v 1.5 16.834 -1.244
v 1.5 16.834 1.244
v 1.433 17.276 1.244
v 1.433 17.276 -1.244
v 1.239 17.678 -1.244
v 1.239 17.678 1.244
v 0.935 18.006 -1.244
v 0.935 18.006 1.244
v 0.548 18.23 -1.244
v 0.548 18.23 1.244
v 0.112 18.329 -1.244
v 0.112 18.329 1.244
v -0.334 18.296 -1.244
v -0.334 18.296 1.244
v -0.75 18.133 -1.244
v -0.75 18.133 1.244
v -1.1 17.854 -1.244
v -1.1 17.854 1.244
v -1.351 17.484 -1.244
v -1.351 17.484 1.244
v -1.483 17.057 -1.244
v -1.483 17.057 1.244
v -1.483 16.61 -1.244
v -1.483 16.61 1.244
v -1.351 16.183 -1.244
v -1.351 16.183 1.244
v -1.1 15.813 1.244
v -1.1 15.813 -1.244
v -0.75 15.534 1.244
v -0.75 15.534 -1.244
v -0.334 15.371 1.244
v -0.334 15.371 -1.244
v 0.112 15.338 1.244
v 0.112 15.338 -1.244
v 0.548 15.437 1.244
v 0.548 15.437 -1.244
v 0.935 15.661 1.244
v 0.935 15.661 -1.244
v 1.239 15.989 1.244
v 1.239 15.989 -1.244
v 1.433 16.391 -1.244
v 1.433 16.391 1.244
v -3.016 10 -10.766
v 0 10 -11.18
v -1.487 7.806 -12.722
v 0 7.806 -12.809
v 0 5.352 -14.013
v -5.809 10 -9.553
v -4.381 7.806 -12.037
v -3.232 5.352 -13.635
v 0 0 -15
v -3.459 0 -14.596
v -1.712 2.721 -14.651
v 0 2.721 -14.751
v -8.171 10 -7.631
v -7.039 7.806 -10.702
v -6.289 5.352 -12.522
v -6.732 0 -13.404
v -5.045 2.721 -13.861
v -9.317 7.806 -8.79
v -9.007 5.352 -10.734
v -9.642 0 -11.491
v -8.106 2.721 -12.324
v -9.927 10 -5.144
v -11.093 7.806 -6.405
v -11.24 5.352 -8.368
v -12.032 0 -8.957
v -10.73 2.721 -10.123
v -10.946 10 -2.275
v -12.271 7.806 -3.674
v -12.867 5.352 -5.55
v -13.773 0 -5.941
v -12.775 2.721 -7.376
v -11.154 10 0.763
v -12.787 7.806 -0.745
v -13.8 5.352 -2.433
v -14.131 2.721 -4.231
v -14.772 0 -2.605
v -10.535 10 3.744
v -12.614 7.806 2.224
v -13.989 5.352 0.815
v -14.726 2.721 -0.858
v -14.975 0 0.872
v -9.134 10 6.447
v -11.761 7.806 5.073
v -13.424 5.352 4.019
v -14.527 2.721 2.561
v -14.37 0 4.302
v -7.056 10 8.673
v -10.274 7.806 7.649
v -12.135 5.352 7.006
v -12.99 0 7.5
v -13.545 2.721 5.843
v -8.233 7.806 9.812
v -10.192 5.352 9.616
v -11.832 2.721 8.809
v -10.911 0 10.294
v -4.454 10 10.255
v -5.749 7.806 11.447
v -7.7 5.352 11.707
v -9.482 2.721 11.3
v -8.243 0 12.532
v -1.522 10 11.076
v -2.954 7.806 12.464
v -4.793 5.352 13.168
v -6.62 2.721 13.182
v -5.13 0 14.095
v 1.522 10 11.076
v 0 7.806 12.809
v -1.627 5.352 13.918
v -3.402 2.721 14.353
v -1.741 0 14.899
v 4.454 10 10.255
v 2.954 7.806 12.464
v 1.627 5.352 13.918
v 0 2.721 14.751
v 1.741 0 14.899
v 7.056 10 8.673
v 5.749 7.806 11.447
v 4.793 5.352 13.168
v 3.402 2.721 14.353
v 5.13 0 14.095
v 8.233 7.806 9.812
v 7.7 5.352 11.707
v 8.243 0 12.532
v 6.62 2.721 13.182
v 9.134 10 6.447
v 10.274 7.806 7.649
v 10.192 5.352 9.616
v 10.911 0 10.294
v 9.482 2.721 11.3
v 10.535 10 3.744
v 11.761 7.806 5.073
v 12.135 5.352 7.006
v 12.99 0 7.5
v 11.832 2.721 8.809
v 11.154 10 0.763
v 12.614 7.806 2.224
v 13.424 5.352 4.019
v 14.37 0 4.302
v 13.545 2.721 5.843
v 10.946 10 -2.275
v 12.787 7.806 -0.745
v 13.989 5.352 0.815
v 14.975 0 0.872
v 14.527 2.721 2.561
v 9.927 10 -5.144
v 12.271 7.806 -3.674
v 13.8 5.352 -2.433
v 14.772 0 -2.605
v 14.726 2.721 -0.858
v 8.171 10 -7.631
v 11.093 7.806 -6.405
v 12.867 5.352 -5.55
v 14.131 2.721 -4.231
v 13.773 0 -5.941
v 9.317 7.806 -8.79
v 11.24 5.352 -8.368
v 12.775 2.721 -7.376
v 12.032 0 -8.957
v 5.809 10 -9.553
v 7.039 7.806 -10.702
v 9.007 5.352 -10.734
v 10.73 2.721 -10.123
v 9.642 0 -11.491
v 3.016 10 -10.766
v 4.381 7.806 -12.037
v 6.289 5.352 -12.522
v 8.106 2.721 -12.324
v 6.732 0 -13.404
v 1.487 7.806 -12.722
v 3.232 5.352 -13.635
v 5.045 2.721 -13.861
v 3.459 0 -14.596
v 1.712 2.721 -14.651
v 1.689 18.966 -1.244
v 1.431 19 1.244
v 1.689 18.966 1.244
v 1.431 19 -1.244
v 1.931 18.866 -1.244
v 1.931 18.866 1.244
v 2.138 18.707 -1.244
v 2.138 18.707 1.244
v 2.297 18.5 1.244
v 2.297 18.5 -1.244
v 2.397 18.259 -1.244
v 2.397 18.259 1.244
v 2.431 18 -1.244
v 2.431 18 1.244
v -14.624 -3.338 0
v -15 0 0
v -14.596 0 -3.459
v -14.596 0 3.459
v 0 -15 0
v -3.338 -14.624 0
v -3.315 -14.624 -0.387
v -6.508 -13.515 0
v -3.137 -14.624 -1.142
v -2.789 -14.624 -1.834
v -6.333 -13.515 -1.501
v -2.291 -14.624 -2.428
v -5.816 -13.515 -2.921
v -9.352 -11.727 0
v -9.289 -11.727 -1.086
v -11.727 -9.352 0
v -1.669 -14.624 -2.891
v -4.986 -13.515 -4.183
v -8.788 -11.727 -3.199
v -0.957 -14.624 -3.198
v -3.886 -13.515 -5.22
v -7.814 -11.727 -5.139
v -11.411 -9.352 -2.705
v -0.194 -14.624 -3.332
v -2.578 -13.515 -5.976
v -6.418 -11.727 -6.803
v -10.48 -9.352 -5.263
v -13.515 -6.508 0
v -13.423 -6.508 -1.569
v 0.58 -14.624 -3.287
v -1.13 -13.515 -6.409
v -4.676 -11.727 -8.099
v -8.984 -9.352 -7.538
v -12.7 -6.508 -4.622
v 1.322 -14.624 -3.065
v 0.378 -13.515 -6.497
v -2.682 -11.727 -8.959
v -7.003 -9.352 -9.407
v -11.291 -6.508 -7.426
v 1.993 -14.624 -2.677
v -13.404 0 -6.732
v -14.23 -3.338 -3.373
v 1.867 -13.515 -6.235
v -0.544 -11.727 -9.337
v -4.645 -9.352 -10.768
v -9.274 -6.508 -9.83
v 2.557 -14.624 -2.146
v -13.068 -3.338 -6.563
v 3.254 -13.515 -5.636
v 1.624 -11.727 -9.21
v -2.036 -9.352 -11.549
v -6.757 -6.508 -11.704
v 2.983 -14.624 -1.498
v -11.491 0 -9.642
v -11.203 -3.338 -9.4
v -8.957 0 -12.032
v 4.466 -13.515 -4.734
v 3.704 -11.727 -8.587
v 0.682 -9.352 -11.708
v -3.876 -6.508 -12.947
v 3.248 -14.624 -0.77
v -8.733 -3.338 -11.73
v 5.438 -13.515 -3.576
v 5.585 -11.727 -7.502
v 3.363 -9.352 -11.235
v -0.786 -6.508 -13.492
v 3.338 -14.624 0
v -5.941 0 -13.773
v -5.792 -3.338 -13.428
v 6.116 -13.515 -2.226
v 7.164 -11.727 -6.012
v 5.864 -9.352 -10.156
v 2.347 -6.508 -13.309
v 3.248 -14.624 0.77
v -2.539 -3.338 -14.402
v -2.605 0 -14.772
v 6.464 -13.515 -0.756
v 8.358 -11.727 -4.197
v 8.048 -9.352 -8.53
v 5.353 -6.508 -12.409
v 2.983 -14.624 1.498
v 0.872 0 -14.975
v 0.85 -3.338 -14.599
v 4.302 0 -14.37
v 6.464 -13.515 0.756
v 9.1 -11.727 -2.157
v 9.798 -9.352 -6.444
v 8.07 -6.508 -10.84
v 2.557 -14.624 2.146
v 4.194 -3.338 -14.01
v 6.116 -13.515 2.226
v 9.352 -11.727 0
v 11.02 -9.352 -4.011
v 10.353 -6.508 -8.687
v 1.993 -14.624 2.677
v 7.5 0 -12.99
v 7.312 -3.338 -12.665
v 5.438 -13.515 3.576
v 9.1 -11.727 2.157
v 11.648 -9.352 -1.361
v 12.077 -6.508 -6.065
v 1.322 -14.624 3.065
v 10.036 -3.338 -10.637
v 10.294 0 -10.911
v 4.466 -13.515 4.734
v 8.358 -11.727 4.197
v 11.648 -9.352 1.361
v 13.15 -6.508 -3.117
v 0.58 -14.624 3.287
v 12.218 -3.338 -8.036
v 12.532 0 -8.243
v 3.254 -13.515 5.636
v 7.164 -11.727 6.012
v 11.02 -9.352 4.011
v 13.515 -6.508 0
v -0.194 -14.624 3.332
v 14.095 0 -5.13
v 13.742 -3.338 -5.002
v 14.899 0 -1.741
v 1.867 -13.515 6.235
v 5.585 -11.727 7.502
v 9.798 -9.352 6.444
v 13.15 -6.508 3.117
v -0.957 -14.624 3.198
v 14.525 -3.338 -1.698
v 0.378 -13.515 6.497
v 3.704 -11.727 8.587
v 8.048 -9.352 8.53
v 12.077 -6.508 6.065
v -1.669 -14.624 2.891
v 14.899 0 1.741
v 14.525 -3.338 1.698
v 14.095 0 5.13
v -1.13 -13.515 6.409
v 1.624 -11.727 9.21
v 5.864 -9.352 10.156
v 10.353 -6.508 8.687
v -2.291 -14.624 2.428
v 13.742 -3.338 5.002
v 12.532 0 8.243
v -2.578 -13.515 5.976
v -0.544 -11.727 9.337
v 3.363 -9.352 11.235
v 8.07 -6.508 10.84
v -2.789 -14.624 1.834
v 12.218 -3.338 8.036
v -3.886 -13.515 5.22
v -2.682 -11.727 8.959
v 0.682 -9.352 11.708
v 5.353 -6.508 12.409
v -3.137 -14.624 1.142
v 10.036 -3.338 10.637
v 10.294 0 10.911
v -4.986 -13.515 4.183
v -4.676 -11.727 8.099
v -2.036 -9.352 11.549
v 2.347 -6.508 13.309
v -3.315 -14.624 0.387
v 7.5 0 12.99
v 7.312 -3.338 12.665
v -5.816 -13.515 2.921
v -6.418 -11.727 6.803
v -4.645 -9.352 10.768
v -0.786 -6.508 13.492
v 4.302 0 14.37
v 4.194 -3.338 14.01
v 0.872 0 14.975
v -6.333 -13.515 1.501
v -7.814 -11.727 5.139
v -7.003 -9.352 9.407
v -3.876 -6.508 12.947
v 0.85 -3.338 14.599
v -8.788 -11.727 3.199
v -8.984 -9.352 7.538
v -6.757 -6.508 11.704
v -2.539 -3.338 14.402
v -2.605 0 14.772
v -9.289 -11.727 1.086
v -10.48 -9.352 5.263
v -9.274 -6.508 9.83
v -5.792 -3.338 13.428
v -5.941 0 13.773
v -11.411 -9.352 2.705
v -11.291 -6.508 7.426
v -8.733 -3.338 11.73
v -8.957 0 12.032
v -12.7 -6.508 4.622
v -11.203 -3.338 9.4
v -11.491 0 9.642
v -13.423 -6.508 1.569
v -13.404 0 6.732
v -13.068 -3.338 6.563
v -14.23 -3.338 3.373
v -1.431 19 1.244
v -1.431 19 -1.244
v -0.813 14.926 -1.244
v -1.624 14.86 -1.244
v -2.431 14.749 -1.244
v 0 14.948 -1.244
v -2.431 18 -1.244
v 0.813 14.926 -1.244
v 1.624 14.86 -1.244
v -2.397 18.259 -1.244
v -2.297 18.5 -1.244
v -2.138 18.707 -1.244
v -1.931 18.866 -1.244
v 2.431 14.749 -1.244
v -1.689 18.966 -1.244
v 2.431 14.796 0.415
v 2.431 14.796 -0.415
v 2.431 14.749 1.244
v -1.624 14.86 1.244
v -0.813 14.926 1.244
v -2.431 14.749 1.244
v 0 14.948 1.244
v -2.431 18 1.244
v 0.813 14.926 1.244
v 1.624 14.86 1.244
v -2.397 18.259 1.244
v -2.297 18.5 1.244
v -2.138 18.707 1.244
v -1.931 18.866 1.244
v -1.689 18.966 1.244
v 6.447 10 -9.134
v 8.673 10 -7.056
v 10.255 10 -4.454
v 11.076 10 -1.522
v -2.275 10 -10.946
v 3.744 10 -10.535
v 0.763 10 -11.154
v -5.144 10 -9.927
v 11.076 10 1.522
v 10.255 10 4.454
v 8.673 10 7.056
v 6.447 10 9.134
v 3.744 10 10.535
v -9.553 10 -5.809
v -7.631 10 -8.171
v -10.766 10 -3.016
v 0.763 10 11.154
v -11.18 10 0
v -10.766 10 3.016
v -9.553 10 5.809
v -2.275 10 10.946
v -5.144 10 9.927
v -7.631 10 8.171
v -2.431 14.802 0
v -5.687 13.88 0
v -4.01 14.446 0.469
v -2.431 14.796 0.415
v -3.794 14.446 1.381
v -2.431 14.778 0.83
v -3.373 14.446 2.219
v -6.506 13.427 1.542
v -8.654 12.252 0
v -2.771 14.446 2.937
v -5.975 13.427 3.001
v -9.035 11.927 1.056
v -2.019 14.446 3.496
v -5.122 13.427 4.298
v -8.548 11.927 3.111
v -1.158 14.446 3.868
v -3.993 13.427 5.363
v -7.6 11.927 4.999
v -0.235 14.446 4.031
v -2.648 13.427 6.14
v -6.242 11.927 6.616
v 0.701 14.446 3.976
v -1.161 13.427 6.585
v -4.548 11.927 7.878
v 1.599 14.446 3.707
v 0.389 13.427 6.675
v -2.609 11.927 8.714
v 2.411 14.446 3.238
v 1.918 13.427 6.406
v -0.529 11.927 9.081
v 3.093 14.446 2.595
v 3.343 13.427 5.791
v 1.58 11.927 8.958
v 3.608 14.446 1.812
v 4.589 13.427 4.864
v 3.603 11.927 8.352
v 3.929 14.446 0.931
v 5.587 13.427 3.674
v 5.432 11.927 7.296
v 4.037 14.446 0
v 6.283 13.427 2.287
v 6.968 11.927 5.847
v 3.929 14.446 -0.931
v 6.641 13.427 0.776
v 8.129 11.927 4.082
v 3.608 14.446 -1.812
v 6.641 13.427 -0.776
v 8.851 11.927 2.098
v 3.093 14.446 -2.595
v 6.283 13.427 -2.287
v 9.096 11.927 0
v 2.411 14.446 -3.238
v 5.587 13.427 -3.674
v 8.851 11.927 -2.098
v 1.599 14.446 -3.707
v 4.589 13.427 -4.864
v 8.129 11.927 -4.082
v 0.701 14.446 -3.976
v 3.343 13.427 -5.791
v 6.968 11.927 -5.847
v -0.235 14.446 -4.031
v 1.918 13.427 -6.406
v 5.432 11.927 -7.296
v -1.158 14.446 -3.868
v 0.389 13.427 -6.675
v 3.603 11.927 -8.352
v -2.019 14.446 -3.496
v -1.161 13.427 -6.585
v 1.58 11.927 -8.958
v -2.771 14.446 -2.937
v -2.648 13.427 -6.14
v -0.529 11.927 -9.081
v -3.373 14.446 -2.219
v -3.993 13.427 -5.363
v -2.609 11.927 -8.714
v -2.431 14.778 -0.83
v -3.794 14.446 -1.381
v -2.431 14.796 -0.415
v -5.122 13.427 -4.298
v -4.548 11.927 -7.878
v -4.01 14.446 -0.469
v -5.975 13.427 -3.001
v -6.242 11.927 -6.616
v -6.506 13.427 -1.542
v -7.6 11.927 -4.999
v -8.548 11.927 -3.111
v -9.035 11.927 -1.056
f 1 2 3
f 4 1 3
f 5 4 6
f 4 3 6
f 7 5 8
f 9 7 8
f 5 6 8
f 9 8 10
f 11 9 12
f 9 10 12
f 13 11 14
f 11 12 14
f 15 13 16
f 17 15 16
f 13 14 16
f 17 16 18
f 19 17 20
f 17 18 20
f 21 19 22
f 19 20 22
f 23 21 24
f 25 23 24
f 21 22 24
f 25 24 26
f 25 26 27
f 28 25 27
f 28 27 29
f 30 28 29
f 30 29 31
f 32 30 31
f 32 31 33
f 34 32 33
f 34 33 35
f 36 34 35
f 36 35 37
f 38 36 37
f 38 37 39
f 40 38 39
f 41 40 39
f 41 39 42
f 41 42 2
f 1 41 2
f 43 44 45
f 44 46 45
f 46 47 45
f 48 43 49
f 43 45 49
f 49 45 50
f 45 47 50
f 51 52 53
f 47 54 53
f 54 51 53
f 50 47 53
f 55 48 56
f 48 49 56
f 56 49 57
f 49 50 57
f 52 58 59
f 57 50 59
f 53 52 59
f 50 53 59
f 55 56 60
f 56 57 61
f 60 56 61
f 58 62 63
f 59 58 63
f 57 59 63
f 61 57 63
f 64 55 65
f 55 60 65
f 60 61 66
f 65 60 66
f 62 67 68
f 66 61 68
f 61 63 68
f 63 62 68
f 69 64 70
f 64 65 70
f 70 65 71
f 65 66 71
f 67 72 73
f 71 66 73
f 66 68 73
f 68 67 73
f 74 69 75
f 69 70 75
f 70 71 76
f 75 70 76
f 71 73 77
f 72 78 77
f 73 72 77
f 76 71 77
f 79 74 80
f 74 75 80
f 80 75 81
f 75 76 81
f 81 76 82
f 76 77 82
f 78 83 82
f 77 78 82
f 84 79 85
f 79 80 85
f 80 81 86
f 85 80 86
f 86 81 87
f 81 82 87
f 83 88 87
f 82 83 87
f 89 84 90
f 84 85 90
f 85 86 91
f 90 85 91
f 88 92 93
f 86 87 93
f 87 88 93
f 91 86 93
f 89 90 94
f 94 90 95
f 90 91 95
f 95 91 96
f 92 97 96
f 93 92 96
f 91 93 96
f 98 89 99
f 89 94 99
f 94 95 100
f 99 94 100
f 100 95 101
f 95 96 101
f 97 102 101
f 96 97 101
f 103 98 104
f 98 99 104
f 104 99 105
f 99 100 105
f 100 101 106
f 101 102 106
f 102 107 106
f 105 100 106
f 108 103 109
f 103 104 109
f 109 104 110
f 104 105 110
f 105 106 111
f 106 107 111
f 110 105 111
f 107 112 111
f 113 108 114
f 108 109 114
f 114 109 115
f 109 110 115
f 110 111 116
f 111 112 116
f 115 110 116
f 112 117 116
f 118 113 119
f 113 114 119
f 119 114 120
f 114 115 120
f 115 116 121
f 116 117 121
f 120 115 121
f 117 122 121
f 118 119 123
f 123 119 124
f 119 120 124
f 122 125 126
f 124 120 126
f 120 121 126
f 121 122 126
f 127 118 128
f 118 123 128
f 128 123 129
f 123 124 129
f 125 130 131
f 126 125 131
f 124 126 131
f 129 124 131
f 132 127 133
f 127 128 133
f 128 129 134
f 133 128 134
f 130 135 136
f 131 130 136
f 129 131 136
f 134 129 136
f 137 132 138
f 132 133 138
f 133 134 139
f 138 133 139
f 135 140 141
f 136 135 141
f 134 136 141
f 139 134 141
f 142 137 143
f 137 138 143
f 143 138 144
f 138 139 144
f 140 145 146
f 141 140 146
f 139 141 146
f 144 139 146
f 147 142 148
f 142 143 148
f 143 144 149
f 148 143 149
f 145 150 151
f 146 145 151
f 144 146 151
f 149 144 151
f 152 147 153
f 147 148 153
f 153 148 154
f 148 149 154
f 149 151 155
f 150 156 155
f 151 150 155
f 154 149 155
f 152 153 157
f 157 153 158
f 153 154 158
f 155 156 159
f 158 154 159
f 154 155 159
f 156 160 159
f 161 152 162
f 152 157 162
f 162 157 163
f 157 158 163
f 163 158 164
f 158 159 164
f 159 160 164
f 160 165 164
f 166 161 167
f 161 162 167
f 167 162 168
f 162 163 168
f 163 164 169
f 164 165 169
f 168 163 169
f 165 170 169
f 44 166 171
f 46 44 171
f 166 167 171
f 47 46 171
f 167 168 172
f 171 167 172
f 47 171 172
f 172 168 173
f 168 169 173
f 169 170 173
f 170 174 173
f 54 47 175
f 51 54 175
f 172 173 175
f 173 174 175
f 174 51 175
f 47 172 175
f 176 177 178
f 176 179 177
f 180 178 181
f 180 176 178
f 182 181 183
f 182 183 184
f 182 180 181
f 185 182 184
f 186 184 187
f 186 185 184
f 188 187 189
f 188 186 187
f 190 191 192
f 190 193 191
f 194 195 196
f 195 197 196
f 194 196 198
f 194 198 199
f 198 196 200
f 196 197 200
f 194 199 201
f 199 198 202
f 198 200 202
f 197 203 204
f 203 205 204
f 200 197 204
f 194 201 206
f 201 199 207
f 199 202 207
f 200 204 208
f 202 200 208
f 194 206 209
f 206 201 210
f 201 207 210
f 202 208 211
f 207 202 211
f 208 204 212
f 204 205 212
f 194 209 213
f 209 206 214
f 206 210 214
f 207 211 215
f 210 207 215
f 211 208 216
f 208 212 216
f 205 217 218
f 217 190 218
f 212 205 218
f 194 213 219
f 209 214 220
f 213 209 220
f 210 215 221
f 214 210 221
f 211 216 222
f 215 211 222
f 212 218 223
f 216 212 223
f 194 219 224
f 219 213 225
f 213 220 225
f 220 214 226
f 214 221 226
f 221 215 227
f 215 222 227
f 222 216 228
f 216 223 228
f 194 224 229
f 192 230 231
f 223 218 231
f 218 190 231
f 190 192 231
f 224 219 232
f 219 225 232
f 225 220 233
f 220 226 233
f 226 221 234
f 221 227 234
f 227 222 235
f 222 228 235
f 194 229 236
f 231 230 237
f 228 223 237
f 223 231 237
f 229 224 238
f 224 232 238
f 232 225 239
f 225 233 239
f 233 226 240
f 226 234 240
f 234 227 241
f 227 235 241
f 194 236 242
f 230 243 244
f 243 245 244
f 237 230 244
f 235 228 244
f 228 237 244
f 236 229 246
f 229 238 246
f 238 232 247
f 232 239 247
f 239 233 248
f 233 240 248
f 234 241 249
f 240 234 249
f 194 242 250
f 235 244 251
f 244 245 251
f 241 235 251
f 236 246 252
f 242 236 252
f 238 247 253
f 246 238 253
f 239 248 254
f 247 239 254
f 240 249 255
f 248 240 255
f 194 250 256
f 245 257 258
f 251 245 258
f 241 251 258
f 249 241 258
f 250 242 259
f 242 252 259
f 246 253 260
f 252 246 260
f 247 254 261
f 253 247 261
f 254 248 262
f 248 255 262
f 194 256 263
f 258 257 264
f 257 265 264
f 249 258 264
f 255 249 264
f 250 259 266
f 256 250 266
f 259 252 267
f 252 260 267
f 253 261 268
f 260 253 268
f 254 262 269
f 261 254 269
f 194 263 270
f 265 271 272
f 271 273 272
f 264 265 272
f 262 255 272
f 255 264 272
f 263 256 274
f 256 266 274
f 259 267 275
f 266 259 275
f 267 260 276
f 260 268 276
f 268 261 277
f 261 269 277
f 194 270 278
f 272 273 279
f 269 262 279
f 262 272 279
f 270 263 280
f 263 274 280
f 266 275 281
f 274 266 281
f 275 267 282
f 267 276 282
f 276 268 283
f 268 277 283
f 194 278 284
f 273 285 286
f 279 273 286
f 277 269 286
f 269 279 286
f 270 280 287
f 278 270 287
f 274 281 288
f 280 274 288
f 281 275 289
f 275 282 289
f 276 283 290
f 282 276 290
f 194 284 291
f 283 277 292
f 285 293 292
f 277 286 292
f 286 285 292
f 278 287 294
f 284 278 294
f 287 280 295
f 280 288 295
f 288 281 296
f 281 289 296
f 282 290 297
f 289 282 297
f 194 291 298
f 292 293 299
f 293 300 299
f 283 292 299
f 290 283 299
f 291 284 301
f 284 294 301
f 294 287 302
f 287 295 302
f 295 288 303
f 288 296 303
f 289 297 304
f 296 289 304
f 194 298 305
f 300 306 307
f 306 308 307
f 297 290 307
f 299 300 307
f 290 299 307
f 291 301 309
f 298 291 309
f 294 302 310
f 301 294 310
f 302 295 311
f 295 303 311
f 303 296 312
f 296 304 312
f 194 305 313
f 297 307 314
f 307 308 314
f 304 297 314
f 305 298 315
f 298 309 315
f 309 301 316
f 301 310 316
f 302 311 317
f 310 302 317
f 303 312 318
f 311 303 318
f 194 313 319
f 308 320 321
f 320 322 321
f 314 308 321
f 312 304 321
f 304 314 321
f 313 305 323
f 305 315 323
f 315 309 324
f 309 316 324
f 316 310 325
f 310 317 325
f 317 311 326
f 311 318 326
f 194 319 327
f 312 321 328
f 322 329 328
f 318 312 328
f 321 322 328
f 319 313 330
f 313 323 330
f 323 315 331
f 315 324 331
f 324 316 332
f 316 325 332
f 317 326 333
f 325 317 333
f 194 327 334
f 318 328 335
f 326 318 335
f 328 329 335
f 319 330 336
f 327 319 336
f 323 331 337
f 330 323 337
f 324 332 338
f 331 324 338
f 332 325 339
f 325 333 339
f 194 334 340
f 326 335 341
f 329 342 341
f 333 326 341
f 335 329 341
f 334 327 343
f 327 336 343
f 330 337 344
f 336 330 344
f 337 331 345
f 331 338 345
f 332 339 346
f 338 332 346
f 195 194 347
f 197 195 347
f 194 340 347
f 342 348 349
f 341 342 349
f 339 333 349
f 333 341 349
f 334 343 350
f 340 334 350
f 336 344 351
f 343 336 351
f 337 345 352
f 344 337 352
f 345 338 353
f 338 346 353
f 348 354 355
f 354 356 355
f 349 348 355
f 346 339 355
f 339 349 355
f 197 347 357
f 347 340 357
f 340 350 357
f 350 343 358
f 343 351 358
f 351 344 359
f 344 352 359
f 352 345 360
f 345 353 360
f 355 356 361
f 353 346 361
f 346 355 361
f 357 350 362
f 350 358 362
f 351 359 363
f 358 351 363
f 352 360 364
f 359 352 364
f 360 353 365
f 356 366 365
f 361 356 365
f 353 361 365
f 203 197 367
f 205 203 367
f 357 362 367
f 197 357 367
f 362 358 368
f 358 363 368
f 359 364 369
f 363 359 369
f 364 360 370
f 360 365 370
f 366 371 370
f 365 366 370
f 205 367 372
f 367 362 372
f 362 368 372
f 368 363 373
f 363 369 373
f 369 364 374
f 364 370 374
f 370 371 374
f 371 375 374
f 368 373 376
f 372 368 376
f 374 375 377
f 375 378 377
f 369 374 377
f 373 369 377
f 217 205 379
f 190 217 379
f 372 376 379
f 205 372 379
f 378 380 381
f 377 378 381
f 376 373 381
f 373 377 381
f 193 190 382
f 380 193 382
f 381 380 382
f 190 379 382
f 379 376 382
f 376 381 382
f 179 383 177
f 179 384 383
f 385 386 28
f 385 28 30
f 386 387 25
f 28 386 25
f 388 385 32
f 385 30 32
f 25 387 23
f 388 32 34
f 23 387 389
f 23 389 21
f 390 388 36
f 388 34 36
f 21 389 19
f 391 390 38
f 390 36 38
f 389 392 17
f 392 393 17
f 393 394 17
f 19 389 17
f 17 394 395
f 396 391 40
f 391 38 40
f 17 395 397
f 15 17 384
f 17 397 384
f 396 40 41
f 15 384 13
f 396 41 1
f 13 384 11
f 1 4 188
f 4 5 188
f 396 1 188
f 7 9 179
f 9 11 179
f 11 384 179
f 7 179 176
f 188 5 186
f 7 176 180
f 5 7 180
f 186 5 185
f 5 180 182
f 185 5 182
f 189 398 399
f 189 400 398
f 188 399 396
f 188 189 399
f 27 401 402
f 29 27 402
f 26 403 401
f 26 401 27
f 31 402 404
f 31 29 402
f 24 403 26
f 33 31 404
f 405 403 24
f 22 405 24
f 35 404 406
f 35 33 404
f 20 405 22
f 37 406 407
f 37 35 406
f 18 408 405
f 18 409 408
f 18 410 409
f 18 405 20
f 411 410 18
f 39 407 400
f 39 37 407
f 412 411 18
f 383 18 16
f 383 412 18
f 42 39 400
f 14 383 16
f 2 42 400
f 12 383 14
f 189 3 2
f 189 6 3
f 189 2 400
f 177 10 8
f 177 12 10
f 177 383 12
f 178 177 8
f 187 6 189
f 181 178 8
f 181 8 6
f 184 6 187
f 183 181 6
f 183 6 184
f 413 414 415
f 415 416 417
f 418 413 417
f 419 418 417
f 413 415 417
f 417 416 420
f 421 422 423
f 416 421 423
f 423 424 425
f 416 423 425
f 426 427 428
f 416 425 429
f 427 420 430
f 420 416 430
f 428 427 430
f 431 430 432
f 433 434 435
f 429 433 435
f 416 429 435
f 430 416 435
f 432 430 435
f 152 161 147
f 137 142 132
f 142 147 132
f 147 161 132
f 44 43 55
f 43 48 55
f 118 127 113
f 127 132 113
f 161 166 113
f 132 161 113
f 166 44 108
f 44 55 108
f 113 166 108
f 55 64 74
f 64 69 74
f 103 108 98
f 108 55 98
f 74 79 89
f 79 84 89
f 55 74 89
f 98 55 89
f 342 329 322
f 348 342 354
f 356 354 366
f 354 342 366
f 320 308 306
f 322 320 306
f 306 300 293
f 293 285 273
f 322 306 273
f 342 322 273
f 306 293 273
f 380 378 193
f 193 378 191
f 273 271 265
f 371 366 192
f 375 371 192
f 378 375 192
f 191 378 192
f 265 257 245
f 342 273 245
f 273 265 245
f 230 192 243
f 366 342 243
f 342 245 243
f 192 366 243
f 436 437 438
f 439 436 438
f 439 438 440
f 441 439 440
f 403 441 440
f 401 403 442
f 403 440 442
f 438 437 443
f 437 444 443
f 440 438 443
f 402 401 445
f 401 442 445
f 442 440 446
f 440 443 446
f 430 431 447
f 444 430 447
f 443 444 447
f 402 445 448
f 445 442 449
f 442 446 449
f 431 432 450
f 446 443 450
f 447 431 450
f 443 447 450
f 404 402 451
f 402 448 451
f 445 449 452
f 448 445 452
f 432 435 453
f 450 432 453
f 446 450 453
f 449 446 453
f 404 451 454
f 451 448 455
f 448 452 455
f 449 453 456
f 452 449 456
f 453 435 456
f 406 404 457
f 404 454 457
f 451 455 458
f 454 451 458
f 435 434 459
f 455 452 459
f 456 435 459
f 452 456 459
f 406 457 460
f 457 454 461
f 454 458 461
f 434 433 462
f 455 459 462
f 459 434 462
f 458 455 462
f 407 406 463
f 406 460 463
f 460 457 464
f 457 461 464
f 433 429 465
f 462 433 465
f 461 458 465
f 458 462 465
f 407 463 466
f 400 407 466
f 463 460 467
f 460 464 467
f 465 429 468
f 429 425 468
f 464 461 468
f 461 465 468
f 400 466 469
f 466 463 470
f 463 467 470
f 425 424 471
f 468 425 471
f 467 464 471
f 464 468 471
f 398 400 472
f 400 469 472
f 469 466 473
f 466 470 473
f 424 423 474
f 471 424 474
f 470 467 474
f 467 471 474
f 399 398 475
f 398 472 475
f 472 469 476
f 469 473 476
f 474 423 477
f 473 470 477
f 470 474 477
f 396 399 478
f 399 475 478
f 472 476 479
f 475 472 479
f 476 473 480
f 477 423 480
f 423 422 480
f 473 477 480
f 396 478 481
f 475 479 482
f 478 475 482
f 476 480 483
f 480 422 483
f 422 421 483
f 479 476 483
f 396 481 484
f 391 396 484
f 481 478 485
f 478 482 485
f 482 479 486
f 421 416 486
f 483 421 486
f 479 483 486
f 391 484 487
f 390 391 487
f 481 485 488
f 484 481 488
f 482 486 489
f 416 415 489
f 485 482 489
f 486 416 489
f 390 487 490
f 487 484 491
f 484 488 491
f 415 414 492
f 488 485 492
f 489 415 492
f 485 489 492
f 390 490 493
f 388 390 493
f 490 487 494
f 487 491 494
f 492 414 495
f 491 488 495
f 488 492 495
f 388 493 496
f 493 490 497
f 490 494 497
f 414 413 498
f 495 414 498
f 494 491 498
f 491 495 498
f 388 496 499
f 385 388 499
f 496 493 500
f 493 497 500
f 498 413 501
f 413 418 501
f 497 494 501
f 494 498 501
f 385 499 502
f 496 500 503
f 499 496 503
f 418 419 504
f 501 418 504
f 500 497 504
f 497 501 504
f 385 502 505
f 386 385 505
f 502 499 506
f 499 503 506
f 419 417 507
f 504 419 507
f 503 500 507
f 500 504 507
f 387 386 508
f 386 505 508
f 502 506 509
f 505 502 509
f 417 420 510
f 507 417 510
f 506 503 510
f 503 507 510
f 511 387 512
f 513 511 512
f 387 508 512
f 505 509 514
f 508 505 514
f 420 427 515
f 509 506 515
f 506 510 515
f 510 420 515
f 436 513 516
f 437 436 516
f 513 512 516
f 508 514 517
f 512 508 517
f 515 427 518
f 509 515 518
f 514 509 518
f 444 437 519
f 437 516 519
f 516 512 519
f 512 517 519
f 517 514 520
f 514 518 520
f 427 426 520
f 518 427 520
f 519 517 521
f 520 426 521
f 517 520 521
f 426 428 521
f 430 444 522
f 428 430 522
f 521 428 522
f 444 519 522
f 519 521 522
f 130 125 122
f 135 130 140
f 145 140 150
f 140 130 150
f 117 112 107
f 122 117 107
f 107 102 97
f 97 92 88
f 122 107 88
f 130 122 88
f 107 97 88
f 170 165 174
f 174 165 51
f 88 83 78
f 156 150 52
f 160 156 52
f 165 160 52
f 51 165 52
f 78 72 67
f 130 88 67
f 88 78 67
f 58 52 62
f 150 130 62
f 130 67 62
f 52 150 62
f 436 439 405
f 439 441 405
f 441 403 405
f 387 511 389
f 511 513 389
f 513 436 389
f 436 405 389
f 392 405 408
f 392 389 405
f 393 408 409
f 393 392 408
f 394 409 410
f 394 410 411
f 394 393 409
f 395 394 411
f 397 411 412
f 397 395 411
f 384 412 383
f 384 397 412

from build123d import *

# Parameters (mm, degrees)
BOSS_EXTRUDE1_START = 19
SKETCH5_W           = 4.861205616
SKETCH5_H           = 2.487128454
BOSS_EXTRUDE1_DEPTH = 5
FILLET1_R           = 1
SKETCH6_R           = 1.5
CUT_EXTRUDE1_DEPTH  = 5


with BuildPart() as part:
    # Sketch1 → Revolve1 (revolve)
    with BuildSketch(Plane.XY):
        with BuildLine():
            Line((0, 0), (0, -15))
            ThreePointArc((0, -15), (-10.606601718, -10.606601718), (-15, 0))
            Line((-15, 0), (0, 0))
        make_face()
    revolve(axis=Axis((0, 0, 0), (0, -1, 0)))


with BuildPart() as body_2:
    # Sketch3 → Revolve3 (revolve)
    with BuildSketch(Plane.XY, mode=Mode.PRIVATE) as revolve3_sk:
        with BuildLine():
            Line((-15, 0), (0, 0))
            Line((0, 0), (0, 10))
            Line((0, 10), (-11.180339887, 10))
            ThreePointArc((-11.180339887, 10), (-14.012585384, 5.352331347), (-15, 0))
        make_face()
    revolve(revolve3_sk.sketch.rotate(Axis((0, 0, 0), (0, 1, 0)), 270), axis=Axis((0, 0, 0), (0, 1, 0)))


with BuildPart() as body_3:
    # Sketch4 → Revolve4 (revolve)
    with BuildSketch(Plane.XY):
        with BuildLine():
            Line((0, 10), (0, 15))
            ThreePointArc((0, 15), (-6.123724357, 13.693063938), (-11.180339887, 10))
            Line((-11.180339887, 10), (0, 10))
        make_face()
    revolve(axis=Axis((0, 10, 0), (0, 1, 0)))

    # Sketch5 → Boss-Extrude1 (add)
    with BuildSketch(Plane(origin=(0, 0, 0), x_dir=(1, 0, 0), z_dir=(0, 1, 0)).offset(BOSS_EXTRUDE1_START)):
        Rectangle(SKETCH5_W, SKETCH5_H)
    extrude(amount=-BOSS_EXTRUDE1_DEPTH)

    # Fillet1
    fillet1_edges = [body_3.edges().sort_by_distance(p)[0] for p in [
        (2.430602808, 19, 0),
        (-2.430602808, 19, 0),
    ]]
    fillet(fillet1_edges, radius=FILLET1_R)

    # Sketch6 → Cut-Extrude1 (cut)
    with BuildSketch(Plane.XY.offset(1.243564227)):
        with Locations((0, 16.8335136)):
            Circle(SKETCH6_R)
    extrude(amount=-CUT_EXTRUDE1_DEPTH, mode=Mode.SUBTRACT)


solid = Compound([part.part, body_2.part, body_3.part])
